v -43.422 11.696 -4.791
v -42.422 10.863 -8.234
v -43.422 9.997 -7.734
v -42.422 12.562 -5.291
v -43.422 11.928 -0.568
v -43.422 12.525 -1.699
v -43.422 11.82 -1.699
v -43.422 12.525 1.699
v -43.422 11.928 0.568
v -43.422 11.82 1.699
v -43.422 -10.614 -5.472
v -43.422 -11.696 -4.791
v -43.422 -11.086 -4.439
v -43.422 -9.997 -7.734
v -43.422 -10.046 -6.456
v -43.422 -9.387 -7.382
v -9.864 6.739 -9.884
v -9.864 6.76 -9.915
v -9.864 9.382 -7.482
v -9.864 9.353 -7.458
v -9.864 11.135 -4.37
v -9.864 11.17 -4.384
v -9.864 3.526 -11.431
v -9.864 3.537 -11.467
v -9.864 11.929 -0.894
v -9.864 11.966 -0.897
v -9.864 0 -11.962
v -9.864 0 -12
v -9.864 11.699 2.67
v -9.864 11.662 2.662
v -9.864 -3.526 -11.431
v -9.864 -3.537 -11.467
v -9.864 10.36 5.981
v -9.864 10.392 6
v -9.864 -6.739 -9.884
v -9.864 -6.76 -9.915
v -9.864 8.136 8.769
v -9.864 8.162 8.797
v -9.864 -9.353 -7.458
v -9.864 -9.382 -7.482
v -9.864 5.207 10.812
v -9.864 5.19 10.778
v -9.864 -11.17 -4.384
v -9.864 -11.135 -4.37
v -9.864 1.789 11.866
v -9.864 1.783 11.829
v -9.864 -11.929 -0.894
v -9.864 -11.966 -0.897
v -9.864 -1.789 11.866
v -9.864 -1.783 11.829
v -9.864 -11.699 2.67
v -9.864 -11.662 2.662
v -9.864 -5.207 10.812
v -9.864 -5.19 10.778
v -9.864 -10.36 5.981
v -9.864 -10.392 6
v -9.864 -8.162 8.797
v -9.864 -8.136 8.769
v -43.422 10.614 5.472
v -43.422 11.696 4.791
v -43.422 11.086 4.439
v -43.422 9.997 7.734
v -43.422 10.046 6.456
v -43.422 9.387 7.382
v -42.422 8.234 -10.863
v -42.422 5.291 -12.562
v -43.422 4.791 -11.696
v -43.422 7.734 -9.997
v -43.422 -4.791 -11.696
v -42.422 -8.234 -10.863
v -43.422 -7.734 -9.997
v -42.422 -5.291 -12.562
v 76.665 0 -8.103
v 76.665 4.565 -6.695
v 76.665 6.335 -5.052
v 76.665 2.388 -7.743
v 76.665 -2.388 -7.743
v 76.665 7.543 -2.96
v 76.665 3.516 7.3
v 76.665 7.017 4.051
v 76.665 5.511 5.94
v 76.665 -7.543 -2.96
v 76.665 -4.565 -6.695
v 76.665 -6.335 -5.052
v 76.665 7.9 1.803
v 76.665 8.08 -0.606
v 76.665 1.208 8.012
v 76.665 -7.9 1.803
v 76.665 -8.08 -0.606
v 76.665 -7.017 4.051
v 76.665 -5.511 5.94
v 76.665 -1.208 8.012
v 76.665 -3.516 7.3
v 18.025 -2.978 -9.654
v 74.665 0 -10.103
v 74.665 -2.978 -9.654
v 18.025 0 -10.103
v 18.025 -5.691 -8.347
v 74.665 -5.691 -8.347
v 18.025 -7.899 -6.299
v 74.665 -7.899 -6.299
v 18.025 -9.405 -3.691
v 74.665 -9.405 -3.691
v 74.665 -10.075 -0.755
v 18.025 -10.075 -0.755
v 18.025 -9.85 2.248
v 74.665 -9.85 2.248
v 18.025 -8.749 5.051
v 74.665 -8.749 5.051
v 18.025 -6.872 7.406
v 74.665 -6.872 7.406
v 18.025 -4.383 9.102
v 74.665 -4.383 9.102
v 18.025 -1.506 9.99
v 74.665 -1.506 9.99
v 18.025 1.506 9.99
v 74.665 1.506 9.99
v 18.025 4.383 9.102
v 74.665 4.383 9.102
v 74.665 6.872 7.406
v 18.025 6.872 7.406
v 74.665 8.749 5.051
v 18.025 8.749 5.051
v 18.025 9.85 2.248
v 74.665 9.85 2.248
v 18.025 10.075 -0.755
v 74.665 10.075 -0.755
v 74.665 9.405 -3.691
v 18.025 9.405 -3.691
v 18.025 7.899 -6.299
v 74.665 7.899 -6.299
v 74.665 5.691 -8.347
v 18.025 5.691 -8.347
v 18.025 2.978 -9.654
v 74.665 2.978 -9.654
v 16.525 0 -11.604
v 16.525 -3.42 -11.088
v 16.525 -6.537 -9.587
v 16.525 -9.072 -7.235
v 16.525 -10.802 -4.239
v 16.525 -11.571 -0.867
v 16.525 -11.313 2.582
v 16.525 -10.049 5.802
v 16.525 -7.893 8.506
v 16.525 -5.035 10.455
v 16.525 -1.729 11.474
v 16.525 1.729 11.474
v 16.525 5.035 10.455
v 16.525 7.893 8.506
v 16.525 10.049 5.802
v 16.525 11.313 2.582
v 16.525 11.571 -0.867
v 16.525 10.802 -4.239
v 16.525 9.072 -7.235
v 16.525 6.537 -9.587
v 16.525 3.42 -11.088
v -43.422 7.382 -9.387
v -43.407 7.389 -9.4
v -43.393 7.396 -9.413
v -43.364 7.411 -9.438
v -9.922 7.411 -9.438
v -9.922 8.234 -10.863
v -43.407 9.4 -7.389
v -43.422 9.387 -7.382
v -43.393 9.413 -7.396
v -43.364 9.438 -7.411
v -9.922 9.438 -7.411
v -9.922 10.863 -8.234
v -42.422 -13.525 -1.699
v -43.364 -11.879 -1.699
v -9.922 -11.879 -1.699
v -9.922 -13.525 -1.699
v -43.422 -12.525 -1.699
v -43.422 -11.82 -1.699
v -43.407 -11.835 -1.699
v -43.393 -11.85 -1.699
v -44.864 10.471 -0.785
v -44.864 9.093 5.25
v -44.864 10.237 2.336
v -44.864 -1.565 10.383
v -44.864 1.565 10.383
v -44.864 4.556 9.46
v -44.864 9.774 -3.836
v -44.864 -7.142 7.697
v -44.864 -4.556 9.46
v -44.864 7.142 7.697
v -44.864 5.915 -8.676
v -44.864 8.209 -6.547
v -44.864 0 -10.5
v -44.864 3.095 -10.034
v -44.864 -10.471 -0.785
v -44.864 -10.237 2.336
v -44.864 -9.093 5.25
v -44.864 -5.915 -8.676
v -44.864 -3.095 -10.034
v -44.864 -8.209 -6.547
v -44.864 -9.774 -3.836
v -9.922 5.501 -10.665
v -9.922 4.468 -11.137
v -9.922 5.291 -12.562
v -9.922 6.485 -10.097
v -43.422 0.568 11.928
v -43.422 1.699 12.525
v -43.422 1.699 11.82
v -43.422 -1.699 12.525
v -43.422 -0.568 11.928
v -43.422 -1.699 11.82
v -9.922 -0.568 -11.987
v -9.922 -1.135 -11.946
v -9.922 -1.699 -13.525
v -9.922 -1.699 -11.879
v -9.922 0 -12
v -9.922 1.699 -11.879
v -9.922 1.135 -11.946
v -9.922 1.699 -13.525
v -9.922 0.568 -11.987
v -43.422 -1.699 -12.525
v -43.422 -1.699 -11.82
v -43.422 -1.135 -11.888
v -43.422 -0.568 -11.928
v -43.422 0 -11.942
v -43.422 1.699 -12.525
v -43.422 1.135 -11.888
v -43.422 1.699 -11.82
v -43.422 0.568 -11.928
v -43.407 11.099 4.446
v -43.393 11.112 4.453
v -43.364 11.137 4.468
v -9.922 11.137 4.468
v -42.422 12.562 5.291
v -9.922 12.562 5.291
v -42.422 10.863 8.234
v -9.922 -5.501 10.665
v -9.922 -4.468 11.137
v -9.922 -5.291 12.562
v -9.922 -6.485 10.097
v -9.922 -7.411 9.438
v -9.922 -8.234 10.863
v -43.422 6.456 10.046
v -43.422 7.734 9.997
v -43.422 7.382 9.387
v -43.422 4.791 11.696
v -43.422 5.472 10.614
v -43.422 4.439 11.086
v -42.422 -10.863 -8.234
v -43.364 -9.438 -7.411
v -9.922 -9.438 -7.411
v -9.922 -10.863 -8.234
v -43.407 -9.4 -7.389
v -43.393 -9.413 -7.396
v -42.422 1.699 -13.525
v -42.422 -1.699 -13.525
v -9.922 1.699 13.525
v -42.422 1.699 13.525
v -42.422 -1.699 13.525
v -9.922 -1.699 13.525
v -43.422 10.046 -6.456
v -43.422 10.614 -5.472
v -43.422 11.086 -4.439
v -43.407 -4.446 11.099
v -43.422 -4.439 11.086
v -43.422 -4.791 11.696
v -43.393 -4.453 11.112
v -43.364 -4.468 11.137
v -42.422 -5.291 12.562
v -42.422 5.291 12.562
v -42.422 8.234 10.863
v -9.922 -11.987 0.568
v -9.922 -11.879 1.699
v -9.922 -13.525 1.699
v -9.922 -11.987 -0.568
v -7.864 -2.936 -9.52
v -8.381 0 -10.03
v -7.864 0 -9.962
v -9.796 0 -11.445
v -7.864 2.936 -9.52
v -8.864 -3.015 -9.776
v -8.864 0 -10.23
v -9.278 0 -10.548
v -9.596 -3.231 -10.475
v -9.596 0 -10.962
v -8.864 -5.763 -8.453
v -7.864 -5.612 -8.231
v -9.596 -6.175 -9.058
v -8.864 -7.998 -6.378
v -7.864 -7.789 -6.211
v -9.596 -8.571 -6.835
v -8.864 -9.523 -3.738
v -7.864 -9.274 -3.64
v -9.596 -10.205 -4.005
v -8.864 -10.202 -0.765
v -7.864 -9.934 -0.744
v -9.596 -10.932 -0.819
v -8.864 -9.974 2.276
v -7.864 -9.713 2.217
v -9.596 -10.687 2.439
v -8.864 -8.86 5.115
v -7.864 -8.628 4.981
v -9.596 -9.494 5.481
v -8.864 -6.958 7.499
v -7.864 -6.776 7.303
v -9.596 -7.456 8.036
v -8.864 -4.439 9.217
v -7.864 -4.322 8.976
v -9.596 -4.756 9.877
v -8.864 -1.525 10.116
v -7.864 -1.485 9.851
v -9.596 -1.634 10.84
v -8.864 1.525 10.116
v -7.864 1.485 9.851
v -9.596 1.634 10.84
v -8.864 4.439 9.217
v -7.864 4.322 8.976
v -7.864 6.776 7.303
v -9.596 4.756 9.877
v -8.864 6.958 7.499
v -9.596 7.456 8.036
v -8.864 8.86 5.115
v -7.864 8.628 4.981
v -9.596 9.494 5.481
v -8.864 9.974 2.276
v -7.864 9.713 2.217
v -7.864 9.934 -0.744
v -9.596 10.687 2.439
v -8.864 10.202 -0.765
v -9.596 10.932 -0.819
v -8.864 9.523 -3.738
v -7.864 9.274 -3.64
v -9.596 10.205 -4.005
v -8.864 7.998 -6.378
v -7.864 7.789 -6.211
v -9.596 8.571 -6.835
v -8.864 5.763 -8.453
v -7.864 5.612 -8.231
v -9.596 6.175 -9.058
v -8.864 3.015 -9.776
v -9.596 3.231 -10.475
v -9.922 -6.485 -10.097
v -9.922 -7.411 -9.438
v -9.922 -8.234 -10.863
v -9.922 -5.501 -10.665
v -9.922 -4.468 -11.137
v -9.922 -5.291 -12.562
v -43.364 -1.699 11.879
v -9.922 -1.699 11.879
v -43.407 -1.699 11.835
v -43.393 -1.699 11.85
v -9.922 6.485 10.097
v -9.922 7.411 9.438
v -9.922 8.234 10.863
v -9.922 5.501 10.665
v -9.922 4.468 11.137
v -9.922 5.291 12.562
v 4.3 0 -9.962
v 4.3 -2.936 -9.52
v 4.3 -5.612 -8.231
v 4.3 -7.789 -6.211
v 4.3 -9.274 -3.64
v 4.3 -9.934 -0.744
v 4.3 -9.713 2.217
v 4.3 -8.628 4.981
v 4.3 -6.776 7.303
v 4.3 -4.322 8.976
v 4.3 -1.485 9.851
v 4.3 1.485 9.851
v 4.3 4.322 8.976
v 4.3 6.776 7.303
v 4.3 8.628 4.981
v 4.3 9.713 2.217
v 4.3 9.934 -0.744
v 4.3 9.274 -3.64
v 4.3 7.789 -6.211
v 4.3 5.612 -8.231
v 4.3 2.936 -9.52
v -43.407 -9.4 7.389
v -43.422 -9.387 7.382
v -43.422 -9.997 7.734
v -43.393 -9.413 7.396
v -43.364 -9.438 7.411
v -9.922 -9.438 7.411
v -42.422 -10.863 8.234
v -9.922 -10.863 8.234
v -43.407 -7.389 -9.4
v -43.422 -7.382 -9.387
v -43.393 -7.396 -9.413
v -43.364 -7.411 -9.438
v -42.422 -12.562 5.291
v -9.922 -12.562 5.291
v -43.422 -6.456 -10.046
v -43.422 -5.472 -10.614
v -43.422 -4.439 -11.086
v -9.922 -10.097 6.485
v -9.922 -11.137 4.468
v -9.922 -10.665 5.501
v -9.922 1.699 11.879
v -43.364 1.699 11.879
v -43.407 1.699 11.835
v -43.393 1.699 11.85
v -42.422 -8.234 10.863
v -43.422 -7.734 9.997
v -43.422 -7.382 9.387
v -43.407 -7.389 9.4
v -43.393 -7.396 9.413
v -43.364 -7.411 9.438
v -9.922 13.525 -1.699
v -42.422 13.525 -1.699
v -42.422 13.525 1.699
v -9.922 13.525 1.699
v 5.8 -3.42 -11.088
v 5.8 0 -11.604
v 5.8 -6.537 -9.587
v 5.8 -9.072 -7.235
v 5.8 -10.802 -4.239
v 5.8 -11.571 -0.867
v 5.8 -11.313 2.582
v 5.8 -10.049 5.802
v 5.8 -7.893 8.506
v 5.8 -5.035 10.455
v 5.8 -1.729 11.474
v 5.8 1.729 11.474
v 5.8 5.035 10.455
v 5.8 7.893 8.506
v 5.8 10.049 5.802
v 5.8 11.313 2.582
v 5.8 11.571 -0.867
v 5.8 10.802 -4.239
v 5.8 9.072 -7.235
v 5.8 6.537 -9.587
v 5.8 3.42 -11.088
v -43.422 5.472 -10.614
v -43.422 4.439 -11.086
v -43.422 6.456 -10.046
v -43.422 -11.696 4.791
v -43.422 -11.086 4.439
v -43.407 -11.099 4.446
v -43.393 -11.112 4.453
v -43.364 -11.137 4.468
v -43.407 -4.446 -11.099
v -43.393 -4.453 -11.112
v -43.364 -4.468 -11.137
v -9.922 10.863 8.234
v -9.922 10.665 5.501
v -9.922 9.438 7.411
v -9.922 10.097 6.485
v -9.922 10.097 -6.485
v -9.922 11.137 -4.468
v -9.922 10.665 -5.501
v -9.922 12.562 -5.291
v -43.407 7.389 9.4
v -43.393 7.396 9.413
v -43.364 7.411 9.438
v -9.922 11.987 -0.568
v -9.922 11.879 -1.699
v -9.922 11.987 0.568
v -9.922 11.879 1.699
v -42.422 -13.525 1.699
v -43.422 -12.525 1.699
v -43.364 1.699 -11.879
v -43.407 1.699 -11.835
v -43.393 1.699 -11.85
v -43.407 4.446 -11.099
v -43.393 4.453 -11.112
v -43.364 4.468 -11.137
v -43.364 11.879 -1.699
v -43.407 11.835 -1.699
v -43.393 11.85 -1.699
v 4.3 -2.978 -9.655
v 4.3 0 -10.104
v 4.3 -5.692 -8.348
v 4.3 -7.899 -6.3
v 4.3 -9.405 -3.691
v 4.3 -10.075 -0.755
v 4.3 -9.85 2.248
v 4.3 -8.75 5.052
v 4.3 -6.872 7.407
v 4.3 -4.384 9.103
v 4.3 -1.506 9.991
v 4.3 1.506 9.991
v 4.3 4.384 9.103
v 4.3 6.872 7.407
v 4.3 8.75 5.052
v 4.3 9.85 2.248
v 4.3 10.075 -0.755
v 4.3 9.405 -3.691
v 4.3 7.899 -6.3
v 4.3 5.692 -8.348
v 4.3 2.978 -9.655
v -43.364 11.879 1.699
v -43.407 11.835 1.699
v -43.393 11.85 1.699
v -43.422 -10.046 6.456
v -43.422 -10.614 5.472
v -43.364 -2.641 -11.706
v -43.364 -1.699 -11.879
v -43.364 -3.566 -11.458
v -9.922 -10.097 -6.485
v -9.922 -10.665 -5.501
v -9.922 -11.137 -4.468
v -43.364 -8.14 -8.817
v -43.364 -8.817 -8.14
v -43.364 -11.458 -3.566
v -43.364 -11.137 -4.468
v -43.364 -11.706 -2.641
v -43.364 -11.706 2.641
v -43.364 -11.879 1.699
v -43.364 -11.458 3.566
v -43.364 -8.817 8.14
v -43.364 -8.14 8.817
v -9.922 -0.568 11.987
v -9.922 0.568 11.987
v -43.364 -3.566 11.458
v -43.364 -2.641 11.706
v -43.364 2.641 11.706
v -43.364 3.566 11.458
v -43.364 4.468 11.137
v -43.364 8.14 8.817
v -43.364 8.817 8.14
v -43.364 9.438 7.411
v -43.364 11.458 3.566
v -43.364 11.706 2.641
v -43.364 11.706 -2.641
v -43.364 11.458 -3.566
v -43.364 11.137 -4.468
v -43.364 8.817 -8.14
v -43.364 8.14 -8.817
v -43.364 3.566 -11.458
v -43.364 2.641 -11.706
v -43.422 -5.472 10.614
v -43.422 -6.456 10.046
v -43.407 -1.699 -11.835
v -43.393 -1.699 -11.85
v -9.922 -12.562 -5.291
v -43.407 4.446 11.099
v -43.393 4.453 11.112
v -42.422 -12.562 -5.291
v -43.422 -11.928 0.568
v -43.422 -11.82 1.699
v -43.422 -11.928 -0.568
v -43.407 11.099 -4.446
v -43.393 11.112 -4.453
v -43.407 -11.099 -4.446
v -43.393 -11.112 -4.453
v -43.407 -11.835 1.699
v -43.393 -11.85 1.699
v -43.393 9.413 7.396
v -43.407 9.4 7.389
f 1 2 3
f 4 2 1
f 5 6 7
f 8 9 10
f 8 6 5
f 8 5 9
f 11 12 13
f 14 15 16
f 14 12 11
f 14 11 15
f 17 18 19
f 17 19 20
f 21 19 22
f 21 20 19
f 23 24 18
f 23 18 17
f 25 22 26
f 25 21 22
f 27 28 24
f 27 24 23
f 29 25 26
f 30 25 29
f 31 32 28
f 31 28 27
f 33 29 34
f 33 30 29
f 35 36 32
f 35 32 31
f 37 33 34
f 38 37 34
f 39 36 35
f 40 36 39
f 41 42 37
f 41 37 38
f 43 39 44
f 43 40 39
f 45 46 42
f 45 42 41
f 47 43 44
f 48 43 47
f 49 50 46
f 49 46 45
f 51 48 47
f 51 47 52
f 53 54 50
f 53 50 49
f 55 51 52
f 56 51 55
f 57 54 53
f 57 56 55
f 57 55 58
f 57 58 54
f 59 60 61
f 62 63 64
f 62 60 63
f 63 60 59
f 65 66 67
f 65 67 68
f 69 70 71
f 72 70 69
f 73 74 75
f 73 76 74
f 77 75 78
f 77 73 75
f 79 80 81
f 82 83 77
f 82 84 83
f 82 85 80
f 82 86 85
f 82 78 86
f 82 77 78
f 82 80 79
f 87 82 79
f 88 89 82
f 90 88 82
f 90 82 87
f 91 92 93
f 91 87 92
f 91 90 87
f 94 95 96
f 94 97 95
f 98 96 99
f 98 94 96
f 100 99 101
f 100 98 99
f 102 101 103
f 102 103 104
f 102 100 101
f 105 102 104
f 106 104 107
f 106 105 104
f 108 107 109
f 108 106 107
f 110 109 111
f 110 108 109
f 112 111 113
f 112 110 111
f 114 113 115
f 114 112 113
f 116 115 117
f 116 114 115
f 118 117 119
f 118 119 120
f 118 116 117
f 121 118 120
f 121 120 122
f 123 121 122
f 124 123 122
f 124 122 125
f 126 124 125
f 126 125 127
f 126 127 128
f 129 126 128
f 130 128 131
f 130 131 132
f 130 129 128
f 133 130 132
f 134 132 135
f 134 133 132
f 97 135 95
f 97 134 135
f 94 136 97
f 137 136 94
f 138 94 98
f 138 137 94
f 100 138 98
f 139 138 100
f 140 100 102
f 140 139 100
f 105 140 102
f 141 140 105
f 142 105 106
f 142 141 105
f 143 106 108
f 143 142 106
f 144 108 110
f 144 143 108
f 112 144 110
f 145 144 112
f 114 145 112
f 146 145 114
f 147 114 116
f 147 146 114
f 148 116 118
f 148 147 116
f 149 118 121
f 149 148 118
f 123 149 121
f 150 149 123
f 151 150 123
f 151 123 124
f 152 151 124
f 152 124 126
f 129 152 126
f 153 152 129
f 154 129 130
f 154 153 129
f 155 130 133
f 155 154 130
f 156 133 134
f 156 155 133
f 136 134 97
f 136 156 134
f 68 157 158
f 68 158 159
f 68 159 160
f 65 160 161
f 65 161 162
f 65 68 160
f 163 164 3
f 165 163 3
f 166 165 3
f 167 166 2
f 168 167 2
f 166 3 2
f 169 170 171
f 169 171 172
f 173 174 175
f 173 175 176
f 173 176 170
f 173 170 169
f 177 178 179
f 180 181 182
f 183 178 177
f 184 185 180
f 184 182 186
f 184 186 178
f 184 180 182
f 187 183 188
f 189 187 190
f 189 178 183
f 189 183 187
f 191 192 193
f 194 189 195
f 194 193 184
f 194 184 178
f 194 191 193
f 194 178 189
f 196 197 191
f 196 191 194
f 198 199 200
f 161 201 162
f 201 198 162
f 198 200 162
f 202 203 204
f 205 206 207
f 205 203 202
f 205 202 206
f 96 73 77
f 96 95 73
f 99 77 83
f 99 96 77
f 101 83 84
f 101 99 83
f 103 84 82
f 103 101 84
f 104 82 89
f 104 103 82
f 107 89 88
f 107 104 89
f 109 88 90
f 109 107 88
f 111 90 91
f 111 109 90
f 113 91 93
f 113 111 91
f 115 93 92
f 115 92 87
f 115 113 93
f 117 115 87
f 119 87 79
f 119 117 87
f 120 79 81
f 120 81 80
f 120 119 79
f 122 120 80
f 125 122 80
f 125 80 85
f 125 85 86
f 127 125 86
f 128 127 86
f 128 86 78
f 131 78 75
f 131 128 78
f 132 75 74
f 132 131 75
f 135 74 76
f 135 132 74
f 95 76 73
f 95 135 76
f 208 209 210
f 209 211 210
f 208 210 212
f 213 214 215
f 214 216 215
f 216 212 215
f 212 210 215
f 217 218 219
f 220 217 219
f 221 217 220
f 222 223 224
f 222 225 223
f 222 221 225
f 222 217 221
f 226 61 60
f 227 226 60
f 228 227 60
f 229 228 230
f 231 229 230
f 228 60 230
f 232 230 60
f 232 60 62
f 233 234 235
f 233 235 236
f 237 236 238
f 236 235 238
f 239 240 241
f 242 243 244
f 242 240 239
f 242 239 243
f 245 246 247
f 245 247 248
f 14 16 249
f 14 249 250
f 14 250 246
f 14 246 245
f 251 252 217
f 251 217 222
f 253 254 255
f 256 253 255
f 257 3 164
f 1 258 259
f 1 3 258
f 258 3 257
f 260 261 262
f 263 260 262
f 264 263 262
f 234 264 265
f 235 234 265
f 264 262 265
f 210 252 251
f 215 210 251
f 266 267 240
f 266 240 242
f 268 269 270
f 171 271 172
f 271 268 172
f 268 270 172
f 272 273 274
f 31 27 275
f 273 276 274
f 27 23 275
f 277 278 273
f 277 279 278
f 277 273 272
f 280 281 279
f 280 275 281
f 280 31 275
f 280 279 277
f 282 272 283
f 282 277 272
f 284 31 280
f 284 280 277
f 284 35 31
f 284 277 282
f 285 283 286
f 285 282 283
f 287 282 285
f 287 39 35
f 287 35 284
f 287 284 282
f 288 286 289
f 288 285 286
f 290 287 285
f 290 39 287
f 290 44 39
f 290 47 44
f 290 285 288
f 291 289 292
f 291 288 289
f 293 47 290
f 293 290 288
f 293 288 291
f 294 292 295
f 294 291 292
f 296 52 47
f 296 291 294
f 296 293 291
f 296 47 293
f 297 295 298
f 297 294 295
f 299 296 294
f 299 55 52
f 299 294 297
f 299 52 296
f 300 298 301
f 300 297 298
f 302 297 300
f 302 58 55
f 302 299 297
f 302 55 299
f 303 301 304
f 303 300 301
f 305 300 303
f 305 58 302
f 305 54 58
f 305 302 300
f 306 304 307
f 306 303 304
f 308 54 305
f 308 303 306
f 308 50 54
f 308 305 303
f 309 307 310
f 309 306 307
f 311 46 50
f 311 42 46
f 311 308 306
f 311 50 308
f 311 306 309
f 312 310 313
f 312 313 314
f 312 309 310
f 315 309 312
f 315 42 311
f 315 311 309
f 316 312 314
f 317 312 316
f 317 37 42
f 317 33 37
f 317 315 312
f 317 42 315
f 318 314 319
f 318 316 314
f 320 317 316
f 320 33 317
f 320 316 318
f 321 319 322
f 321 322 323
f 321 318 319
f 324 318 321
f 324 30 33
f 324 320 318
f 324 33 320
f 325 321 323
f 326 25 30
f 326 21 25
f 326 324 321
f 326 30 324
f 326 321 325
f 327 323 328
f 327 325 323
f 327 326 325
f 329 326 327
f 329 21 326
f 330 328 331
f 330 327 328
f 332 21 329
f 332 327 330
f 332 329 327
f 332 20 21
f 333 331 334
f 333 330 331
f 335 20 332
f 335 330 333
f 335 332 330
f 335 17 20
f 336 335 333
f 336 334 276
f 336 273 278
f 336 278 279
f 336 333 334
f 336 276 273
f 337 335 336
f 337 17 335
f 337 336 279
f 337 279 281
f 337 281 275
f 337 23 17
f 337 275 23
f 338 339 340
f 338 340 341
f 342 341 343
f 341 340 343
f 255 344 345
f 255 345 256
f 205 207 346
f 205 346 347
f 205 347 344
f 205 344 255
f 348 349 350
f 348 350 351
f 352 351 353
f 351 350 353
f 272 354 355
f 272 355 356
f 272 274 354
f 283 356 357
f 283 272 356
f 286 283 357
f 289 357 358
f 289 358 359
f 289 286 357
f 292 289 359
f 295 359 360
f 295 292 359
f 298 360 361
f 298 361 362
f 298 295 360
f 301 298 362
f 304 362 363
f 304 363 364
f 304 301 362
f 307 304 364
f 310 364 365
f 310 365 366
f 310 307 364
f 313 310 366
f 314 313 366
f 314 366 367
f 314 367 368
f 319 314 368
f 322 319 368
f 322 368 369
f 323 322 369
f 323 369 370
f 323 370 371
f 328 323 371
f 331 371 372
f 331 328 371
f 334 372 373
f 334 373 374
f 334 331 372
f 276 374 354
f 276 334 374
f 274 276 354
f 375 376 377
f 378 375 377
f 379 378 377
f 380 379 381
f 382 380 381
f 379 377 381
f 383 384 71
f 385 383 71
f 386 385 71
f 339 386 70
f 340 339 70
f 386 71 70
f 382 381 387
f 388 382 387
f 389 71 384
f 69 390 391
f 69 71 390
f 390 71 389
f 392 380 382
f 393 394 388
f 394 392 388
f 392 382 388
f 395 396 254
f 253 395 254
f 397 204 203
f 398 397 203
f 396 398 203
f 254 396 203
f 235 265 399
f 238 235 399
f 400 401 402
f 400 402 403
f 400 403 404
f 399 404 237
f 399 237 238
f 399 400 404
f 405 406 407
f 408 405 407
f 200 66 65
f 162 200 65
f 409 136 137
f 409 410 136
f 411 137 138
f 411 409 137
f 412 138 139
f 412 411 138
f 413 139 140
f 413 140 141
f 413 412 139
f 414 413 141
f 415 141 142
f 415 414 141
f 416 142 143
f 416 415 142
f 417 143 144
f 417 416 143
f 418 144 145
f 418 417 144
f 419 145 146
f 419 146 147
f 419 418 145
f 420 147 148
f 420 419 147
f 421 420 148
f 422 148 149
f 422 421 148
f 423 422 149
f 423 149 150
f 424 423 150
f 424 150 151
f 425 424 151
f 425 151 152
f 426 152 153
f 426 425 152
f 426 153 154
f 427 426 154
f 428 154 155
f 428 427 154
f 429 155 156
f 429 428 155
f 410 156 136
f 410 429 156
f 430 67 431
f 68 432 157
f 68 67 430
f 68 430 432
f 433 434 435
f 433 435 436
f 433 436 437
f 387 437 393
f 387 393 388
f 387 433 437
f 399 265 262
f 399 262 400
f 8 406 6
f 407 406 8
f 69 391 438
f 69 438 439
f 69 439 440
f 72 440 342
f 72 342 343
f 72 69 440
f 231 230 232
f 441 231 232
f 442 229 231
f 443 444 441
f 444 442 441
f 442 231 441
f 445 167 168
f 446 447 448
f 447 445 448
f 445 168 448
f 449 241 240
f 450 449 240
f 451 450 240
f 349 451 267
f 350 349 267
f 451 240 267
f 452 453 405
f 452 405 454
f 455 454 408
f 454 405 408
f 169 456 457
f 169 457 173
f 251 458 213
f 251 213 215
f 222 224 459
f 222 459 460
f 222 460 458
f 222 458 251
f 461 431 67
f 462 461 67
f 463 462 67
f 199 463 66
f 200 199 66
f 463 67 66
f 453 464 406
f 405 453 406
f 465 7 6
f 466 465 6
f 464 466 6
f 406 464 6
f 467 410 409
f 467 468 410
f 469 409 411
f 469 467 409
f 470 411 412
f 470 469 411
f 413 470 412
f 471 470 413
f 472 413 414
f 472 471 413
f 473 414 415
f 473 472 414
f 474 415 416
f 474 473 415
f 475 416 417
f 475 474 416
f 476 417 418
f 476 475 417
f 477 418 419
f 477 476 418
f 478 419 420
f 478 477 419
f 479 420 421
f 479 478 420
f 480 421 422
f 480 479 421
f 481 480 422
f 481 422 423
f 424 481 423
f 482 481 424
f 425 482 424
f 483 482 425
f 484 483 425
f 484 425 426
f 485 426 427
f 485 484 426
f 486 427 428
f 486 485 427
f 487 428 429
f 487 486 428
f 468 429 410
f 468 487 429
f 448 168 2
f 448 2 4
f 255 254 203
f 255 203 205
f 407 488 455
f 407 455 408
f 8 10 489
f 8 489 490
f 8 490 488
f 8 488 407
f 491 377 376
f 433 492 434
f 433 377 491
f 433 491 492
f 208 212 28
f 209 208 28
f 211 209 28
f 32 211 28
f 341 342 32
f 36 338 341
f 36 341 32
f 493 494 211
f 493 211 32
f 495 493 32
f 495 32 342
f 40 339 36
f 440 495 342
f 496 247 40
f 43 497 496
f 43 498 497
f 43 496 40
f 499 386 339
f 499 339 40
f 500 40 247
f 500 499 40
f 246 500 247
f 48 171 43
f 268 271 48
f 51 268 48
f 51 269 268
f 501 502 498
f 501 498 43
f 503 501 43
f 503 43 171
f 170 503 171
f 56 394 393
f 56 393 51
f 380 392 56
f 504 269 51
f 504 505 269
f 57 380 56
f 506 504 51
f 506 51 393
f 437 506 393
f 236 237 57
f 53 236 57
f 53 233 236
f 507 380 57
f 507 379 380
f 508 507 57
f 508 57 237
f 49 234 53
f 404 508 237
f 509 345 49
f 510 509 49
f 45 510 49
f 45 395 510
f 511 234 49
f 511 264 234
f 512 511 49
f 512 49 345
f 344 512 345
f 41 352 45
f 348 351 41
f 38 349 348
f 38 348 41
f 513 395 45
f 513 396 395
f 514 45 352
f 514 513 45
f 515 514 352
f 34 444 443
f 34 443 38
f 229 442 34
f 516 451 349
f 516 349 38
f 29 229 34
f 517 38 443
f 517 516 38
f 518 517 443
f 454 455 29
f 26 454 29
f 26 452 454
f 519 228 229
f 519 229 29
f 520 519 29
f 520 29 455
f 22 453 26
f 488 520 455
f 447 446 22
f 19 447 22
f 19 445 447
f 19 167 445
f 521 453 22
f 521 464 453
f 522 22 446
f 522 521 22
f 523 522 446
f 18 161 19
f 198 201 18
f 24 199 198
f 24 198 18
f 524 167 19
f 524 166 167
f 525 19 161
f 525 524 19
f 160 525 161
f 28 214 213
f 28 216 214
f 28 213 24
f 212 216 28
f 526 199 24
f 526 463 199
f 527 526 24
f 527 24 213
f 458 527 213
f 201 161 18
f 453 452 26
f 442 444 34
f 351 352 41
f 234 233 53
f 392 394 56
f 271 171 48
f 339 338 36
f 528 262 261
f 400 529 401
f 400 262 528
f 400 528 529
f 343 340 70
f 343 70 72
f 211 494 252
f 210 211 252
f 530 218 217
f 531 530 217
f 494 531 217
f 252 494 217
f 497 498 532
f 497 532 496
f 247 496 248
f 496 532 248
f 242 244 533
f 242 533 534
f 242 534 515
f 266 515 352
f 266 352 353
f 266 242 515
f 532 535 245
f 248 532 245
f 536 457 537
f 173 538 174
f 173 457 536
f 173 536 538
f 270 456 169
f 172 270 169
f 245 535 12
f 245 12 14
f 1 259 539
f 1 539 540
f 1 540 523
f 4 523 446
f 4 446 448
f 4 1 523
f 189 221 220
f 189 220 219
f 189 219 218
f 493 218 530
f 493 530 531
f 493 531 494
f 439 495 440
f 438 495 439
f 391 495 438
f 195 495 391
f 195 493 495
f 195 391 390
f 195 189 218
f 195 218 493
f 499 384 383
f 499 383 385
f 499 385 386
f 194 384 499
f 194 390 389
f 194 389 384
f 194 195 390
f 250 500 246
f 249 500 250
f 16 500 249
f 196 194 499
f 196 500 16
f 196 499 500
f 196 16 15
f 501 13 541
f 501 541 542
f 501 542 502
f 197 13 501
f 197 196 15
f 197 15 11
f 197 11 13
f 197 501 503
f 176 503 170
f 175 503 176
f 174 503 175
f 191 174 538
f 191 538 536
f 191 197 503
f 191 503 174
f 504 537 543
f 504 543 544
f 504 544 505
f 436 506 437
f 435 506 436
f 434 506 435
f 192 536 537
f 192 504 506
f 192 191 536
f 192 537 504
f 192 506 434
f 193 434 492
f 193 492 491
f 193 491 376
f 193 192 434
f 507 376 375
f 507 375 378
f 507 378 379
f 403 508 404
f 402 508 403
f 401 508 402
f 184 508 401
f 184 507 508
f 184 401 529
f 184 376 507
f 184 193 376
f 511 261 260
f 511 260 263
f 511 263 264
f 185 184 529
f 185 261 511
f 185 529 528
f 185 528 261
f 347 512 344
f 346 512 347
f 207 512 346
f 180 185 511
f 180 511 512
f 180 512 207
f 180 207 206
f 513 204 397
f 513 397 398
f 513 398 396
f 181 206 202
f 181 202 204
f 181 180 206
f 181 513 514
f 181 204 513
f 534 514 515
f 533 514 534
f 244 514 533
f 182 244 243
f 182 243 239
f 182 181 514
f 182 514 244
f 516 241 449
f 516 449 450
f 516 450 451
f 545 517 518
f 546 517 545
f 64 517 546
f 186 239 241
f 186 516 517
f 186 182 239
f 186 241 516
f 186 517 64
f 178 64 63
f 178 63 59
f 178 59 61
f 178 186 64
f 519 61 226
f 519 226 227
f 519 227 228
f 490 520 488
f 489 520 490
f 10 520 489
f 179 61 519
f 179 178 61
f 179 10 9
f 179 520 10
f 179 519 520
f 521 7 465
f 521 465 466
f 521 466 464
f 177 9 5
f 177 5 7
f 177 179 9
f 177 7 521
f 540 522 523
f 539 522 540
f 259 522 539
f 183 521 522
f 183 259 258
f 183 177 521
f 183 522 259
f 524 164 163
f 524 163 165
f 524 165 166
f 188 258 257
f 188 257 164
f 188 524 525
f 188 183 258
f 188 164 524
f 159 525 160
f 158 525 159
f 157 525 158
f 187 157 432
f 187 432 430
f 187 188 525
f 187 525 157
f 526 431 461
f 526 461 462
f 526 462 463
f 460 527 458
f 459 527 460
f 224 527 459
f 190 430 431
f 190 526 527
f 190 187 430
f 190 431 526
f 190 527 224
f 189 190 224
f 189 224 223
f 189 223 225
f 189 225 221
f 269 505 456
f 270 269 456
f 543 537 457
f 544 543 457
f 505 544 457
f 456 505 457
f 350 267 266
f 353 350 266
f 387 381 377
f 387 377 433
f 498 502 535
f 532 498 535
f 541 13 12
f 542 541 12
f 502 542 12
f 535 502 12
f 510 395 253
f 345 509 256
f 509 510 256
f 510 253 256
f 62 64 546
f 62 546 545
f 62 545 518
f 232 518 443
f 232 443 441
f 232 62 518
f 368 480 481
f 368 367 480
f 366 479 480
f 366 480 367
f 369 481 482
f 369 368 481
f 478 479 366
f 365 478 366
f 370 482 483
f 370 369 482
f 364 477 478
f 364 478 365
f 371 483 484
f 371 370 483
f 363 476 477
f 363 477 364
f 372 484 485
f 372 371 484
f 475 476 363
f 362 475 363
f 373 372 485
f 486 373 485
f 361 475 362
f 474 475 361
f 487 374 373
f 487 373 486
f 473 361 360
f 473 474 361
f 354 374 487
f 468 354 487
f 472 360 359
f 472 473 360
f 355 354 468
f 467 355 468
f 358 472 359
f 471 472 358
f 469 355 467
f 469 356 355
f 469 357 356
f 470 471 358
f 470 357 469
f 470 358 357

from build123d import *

# Parameters (mm, degrees)
BOSS_EXTRUDE1_START = -1.5
SKETCH2_W           = 3.398401164
SKETCH2_H           = 2.43903778
BOSS_EXTRUDE1_DEPTH = 33.5
CIRPATTERN1_COUNT   = 12
CHAMFER1_SIZE       = 1


with BuildPart() as part:
    # Sketch1 → Revolve1 (revolve)
    with BuildSketch(Plane(origin=(0, 0, 0), x_dir=(1, 0, 0), z_dir=(0, 1, 0))):
        with BuildLine():
            Line((-44.863739249, 0), (76.664890153, 0))
            Line((76.664890153, 0), (76.664890153, 8.102912078))
            Line((76.664890153, 8.102912078), (74.664890153, 10.102912078))
            Line((74.664890153, 10.102912078), (18.02464627, 10.102912078))
            Line((18.02464627, 10.102912078), (16.52464627, 11.60370674))
            Line((16.52464627, 11.60370674), (5.800309153, 11.60370674))
            Line((5.800309153, 11.60370674), (4.300309153, 10.10370674))
            Line((4.300309153, 10.10370674), (4.300309153, 9.962333128))
            Line((4.300309153, 9.962333128), (-7.863739249, 9.962333128))
            ThreePointArc((-7.863739249, 9.962333128), (-9.277952812, 10.548119565), (-9.863739249, 11.962333128))
            Line((-9.863739249, 11.962333128), (-9.863739249, 12))
            Line((-9.863739249, 12), (-43.363739249, 12))
            Line((-43.363739249, 12), (-44.863739249, 10.5))
            Line((-44.863739249, 10.5), (-44.863739249, 0))
        make_face()
    revolve(axis=Axis((77.994791667, 0, 0), (-1, 0, 0)))

    # Sketch2 → Boss-Extrude1 (add)
    with BuildSketch(Plane.ZY.offset(44.921875).offset(BOSS_EXTRUDE1_START)):
        with Locations((0, 12.305085941)):
            Rectangle(SKETCH2_W, SKETCH2_H)
    boss_extrude1 = extrude(amount=-BOSS_EXTRUDE1_DEPTH)

    # CirPattern1: Boss-Extrude1 ×12 about axis
    cirpattern1_axis = Axis((0, 0, 0), (1, 0, 0))
    for i in range(1, CIRPATTERN1_COUNT):
        add(boss_extrude1.rotate(cirpattern1_axis, i * 360 / CIRPATTERN1_COUNT))

    # Chamfer1
    chamfer1_edges = [part.edges().sort_by_distance(p)[0] for p in [
        (-43.421875, -11.71265136, 6.762302416),
        (-43.421875, -13.524604831, 0),
        (-43.421875, -11.71265136, -6.762302416),
        (-43.421875, -6.762302416, -11.71265136),
        (-43.421875, 0, -13.524604831),
        (-43.421875, 6.762302416, -11.71265136),
        (-43.421875, 11.71265136, -6.762302416),
        (-43.421875, 13.524604831, 0),
        (-43.421875, 11.71265136, 6.762302416),
        (-43.421875, 6.762302416, 11.71265136),
        (-43.421875, 0, 13.524604831),
        (-43.421875, -6.762302416, 11.71265136),
    ]]
    chamfer(chamfer1_edges, length=CHAMFER1_SIZE)


solid = part.part
